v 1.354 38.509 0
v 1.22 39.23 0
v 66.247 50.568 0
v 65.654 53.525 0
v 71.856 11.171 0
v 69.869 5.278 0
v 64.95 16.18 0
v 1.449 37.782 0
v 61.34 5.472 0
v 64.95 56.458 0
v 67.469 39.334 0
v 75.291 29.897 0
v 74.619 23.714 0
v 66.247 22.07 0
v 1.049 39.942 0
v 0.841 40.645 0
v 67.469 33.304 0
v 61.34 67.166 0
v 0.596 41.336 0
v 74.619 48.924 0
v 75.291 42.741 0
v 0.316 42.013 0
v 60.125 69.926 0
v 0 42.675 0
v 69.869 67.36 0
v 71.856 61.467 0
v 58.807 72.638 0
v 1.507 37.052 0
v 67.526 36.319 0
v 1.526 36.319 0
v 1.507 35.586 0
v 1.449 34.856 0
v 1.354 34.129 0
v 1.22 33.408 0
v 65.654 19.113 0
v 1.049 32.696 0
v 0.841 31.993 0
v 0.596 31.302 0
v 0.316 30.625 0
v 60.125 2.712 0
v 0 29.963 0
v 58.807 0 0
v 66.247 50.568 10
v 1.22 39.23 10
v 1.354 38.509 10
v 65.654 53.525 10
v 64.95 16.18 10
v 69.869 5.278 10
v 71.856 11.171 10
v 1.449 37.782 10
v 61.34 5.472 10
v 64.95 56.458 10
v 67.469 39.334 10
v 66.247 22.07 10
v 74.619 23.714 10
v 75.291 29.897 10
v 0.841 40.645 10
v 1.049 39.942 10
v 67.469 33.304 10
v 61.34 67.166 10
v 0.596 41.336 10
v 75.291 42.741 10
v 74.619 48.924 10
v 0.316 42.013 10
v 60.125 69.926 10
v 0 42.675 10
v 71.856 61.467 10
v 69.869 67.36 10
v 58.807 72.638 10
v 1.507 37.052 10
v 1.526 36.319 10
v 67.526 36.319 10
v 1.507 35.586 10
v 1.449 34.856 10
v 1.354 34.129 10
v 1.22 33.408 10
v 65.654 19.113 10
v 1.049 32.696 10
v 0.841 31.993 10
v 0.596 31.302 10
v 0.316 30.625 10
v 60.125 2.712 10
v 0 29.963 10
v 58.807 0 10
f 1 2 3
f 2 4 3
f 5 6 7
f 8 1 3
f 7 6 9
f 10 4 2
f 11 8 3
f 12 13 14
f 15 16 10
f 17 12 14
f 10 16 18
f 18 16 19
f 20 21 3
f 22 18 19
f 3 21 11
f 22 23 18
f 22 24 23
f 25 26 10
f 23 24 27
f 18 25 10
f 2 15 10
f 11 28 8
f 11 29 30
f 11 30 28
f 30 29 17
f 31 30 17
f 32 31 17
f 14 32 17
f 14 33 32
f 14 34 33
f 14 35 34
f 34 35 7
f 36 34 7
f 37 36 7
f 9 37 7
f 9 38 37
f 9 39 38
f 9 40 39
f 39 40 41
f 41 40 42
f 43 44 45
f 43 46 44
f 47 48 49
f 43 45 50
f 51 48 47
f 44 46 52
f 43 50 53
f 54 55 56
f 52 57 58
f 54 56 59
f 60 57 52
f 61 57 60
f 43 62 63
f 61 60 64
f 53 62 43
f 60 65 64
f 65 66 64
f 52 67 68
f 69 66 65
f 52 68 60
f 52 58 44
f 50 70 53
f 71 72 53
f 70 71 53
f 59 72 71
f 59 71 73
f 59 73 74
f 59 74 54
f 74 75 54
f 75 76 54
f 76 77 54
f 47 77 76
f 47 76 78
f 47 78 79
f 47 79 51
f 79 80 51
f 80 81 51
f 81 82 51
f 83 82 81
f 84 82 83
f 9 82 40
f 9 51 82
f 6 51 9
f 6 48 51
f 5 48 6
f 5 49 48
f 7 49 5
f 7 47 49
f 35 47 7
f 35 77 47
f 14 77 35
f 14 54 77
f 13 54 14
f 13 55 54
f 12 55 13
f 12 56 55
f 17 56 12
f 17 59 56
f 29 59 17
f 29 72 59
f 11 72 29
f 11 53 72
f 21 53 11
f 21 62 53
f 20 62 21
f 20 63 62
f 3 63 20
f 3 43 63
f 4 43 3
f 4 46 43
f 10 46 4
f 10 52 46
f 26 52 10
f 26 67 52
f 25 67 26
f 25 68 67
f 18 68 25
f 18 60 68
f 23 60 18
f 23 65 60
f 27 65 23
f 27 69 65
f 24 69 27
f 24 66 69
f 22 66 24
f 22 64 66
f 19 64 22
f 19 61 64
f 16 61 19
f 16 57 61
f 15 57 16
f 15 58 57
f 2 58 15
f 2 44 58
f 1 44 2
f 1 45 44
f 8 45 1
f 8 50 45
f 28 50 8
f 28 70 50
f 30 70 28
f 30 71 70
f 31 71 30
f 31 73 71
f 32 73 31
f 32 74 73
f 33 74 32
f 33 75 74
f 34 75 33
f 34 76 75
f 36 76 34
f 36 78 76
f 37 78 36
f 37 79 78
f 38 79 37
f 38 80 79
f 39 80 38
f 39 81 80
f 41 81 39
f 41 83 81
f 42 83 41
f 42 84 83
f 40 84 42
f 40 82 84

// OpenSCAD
$fn = 32;

// ----------------------------------------------------------------------
// Gear sector: 4 teeth on 54 degrees
// ----------------------------------------------------------------------

// --- parameters (mm) ---
sector_angle = 54;        // sector angle, degrees
root_r = 80;              // root circle radius
tooth_h = 8;              // tooth height over the root circle
teeth = 4;                // number of teeth on the sector
hub_r = 14;               // hub bore radius
plate_t = 10;             // sector thickness, Z
arc_step = 3;             // sampling step of the root/hub arcs, degrees

tip_r = root_r + tooth_h;  // tip circle radius

profile = [[58.807, 0], [60.125, 2.712], [61.34, 5.472], [69.869, 5.278], [71.856, 11.171], [64.95, 16.18], [65.654, 19.113], [66.247, 22.07], [74.619, 23.714], [75.291, 29.897], [67.469, 33.304], [67.526, 36.319], [67.469, 39.334], [75.291, 42.741], [74.619, 48.924], [66.247, 50.568], [65.654, 53.525], [64.95, 56.458], [71.856, 61.467], [69.869, 67.36], [61.34, 67.166], [60.125, 69.926], [58.807, 72.638], [0, 42.675], [0.316, 42.013], [0.596, 41.336], [0.841, 40.645], [1.049, 39.942], [1.22, 39.23], [1.354, 38.509], [1.449, 37.782], [1.507, 37.052], [1.526, 36.319], [1.507, 35.586], [1.449, 34.856], [1.354, 34.129], [1.22, 33.408], [1.049, 32.696], [0.841, 31.993], [0.596, 31.302], [0.316, 30.625], [0, 29.963]];  // primary outline, 42 points, counter clockwise

// --- the one profile operation ---
linear_extrude(height = plate_t) polygon(points = profile);
